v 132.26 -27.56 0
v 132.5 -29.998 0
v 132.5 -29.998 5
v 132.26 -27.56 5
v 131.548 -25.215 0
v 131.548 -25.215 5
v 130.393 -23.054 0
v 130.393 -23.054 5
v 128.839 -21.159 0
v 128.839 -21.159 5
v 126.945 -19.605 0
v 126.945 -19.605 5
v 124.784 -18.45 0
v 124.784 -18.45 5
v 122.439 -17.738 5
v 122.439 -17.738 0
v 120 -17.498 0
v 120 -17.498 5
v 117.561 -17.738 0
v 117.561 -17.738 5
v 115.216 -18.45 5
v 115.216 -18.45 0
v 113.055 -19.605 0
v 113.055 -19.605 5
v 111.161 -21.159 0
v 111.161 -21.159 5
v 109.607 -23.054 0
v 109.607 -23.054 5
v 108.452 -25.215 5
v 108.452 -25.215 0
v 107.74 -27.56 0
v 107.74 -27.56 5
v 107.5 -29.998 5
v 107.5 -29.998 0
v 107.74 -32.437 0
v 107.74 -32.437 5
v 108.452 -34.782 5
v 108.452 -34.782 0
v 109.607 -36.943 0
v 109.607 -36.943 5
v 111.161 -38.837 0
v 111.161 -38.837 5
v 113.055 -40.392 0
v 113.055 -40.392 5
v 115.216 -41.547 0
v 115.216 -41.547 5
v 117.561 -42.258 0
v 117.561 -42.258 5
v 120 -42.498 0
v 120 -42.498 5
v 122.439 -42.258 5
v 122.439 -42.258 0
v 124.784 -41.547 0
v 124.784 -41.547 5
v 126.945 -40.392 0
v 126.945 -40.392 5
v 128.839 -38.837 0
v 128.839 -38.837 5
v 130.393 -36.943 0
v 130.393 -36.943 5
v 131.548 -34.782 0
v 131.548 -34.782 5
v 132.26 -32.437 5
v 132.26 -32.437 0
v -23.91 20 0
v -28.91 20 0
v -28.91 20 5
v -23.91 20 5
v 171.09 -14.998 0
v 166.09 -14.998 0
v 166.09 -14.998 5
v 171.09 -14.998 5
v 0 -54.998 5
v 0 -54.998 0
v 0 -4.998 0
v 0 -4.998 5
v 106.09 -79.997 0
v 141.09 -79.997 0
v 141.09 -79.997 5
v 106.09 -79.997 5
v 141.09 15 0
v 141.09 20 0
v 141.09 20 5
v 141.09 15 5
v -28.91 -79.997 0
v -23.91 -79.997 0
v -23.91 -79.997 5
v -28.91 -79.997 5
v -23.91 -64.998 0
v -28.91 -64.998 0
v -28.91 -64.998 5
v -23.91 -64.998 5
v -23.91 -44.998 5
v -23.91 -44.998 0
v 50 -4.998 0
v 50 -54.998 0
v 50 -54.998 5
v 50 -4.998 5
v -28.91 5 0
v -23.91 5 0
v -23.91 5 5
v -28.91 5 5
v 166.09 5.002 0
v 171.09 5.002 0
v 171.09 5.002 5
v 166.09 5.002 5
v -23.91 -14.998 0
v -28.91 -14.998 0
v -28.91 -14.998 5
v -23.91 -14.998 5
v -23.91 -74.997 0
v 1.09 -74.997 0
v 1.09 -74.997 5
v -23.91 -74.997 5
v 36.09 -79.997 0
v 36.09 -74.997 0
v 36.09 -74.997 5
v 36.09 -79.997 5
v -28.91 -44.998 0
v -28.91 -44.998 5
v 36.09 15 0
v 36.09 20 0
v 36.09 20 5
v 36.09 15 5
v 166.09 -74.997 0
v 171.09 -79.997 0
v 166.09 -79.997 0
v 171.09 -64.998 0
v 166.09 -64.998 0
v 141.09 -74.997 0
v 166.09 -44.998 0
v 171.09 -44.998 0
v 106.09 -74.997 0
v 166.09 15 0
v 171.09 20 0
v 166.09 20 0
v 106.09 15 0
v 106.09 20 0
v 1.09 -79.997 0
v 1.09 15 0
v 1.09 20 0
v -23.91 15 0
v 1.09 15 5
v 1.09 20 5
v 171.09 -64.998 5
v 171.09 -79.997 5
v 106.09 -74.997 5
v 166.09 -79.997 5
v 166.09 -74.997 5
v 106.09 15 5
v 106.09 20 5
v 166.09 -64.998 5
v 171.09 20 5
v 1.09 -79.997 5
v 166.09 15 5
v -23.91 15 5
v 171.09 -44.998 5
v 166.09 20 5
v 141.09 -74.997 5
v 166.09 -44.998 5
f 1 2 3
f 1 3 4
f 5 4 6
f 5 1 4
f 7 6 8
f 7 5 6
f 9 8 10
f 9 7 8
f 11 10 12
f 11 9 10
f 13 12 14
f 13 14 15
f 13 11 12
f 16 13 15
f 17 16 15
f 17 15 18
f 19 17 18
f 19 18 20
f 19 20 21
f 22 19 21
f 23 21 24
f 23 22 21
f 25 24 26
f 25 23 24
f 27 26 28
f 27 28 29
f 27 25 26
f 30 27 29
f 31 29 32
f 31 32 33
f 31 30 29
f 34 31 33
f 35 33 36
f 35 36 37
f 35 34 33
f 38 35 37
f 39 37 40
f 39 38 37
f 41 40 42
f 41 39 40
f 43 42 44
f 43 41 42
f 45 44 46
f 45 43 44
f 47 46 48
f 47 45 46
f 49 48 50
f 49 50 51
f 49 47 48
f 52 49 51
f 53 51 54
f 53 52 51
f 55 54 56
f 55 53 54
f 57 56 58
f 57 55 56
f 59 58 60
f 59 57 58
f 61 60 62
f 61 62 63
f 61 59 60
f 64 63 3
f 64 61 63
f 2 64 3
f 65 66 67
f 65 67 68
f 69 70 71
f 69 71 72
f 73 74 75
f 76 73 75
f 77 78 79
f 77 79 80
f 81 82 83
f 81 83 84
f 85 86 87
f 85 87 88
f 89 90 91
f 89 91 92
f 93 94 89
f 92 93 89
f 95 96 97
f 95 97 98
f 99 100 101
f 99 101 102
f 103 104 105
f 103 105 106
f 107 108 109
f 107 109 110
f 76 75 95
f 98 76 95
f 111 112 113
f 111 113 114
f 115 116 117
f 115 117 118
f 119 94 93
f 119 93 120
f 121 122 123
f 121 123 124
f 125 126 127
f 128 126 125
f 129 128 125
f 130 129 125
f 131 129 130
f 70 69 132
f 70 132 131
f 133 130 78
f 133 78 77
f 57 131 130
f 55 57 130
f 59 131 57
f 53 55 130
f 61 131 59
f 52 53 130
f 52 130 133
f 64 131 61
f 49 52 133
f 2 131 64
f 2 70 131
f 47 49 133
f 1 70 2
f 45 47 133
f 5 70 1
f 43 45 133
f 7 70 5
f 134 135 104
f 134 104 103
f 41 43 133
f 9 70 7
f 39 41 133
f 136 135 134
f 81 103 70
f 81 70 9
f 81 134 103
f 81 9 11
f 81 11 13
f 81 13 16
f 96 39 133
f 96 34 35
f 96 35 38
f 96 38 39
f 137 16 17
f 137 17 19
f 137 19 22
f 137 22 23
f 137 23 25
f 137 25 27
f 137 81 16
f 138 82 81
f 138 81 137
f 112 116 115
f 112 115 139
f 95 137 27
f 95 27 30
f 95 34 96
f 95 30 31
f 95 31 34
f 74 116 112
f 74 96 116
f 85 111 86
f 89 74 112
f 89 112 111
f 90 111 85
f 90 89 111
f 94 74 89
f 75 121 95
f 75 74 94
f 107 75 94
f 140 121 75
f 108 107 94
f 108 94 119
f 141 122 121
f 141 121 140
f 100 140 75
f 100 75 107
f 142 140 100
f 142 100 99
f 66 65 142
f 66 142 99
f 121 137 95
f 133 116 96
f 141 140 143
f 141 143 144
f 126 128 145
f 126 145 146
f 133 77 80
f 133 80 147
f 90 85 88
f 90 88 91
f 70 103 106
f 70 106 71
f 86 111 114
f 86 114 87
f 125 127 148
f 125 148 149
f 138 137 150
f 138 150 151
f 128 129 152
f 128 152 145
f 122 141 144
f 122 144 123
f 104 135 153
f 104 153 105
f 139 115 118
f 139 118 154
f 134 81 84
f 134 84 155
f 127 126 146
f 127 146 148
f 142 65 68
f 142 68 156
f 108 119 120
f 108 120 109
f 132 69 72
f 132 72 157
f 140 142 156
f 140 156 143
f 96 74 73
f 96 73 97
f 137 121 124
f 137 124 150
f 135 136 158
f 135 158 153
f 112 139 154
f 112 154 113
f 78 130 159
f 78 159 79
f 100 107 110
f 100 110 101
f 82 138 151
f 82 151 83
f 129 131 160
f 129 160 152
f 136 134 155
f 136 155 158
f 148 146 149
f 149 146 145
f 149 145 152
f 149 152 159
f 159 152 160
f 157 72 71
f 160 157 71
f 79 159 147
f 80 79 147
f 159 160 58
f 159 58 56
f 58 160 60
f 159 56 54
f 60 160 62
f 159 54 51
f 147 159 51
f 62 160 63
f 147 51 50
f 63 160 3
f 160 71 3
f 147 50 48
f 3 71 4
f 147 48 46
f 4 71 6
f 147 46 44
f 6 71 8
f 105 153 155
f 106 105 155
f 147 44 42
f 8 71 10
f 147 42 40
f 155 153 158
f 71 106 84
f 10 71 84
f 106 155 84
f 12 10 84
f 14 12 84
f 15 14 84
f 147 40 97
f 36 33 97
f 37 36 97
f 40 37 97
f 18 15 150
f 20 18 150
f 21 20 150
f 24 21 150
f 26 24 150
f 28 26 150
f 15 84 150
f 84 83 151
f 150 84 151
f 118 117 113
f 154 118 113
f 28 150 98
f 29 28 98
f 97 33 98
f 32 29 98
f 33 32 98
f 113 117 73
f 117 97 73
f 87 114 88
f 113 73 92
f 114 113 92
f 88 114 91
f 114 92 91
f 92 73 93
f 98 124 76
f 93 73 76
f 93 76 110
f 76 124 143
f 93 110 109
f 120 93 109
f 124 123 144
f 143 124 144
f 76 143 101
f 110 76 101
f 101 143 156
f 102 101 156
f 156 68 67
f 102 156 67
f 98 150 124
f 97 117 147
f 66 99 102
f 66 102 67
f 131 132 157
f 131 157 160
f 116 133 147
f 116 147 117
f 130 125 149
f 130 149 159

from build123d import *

# Parameters (mm, degrees)
ESQUISSE1_R        = 12.5
ESQUISSE1_W        = 50
ESQUISSE1_H        = 50
BOSS_EXTRU_1_DEPTH = 5


with BuildPart() as part:
    # Esquisse1 → Boss.-Extru.1 (new body)
    with BuildSketch(Plane.XY):
        Polygon((-28.909774436, 20), (-23.909774436, 20), (-23.909774436, 15), (1.090225564, 15), (1.090225564, 20), (36.090225564, 20), (36.090225564, 15), (106.090225564, 15), (106.090225564, 20), (141.090225564, 20), (141.090225564, 15), (166.090225564, 15), (166.090225564, 20), (171.090225564, 20), (171.090225564, 5.001724715), (166.090225564, 5.001724715), (166.090225564, -14.998275285), (171.090225564, -14.998275285), (171.090225564, -44.998275285), (166.090225564, -44.998275285), (166.090225564, -64.998275285), (171.090225564, -64.998275285), (171.090225564, -79.99655057), (166.090225564, -79.99655057), (166.090225564, -74.99655057), (141.090225564, -74.99655057), (141.090225564, -79.99655057), (106.090225564, -79.99655057), (106.090225564, -74.99655057), (36.090225564, -74.99655057), (36.090225564, -79.99655057), (1.090225564, -79.99655057), (1.090225564, -74.99655057), (-23.909774436, -74.99655057), (-23.909774436, -79.99655057), (-28.909774436, -79.99655057), (-28.909774436, -64.998275285), (-23.909774436, -64.998275285), (-23.909774436, -59.99655057), (-23.909774436, -44.998275285), (-28.909774436, -44.998275285), (-28.909774436, -14.998275285), (-23.909774436, -14.998275285), (-23.909774436, 5), (-28.909774436, 5), align=None)
        with Locations((120, -29.998275285)):
            Circle(ESQUISSE1_R, mode=Mode.SUBTRACT)
        with Locations((25, -29.998275285)):
            Rectangle(ESQUISSE1_W, ESQUISSE1_H, mode=Mode.SUBTRACT)
    extrude(amount=BOSS_EXTRU_1_DEPTH)


solid = part.part
